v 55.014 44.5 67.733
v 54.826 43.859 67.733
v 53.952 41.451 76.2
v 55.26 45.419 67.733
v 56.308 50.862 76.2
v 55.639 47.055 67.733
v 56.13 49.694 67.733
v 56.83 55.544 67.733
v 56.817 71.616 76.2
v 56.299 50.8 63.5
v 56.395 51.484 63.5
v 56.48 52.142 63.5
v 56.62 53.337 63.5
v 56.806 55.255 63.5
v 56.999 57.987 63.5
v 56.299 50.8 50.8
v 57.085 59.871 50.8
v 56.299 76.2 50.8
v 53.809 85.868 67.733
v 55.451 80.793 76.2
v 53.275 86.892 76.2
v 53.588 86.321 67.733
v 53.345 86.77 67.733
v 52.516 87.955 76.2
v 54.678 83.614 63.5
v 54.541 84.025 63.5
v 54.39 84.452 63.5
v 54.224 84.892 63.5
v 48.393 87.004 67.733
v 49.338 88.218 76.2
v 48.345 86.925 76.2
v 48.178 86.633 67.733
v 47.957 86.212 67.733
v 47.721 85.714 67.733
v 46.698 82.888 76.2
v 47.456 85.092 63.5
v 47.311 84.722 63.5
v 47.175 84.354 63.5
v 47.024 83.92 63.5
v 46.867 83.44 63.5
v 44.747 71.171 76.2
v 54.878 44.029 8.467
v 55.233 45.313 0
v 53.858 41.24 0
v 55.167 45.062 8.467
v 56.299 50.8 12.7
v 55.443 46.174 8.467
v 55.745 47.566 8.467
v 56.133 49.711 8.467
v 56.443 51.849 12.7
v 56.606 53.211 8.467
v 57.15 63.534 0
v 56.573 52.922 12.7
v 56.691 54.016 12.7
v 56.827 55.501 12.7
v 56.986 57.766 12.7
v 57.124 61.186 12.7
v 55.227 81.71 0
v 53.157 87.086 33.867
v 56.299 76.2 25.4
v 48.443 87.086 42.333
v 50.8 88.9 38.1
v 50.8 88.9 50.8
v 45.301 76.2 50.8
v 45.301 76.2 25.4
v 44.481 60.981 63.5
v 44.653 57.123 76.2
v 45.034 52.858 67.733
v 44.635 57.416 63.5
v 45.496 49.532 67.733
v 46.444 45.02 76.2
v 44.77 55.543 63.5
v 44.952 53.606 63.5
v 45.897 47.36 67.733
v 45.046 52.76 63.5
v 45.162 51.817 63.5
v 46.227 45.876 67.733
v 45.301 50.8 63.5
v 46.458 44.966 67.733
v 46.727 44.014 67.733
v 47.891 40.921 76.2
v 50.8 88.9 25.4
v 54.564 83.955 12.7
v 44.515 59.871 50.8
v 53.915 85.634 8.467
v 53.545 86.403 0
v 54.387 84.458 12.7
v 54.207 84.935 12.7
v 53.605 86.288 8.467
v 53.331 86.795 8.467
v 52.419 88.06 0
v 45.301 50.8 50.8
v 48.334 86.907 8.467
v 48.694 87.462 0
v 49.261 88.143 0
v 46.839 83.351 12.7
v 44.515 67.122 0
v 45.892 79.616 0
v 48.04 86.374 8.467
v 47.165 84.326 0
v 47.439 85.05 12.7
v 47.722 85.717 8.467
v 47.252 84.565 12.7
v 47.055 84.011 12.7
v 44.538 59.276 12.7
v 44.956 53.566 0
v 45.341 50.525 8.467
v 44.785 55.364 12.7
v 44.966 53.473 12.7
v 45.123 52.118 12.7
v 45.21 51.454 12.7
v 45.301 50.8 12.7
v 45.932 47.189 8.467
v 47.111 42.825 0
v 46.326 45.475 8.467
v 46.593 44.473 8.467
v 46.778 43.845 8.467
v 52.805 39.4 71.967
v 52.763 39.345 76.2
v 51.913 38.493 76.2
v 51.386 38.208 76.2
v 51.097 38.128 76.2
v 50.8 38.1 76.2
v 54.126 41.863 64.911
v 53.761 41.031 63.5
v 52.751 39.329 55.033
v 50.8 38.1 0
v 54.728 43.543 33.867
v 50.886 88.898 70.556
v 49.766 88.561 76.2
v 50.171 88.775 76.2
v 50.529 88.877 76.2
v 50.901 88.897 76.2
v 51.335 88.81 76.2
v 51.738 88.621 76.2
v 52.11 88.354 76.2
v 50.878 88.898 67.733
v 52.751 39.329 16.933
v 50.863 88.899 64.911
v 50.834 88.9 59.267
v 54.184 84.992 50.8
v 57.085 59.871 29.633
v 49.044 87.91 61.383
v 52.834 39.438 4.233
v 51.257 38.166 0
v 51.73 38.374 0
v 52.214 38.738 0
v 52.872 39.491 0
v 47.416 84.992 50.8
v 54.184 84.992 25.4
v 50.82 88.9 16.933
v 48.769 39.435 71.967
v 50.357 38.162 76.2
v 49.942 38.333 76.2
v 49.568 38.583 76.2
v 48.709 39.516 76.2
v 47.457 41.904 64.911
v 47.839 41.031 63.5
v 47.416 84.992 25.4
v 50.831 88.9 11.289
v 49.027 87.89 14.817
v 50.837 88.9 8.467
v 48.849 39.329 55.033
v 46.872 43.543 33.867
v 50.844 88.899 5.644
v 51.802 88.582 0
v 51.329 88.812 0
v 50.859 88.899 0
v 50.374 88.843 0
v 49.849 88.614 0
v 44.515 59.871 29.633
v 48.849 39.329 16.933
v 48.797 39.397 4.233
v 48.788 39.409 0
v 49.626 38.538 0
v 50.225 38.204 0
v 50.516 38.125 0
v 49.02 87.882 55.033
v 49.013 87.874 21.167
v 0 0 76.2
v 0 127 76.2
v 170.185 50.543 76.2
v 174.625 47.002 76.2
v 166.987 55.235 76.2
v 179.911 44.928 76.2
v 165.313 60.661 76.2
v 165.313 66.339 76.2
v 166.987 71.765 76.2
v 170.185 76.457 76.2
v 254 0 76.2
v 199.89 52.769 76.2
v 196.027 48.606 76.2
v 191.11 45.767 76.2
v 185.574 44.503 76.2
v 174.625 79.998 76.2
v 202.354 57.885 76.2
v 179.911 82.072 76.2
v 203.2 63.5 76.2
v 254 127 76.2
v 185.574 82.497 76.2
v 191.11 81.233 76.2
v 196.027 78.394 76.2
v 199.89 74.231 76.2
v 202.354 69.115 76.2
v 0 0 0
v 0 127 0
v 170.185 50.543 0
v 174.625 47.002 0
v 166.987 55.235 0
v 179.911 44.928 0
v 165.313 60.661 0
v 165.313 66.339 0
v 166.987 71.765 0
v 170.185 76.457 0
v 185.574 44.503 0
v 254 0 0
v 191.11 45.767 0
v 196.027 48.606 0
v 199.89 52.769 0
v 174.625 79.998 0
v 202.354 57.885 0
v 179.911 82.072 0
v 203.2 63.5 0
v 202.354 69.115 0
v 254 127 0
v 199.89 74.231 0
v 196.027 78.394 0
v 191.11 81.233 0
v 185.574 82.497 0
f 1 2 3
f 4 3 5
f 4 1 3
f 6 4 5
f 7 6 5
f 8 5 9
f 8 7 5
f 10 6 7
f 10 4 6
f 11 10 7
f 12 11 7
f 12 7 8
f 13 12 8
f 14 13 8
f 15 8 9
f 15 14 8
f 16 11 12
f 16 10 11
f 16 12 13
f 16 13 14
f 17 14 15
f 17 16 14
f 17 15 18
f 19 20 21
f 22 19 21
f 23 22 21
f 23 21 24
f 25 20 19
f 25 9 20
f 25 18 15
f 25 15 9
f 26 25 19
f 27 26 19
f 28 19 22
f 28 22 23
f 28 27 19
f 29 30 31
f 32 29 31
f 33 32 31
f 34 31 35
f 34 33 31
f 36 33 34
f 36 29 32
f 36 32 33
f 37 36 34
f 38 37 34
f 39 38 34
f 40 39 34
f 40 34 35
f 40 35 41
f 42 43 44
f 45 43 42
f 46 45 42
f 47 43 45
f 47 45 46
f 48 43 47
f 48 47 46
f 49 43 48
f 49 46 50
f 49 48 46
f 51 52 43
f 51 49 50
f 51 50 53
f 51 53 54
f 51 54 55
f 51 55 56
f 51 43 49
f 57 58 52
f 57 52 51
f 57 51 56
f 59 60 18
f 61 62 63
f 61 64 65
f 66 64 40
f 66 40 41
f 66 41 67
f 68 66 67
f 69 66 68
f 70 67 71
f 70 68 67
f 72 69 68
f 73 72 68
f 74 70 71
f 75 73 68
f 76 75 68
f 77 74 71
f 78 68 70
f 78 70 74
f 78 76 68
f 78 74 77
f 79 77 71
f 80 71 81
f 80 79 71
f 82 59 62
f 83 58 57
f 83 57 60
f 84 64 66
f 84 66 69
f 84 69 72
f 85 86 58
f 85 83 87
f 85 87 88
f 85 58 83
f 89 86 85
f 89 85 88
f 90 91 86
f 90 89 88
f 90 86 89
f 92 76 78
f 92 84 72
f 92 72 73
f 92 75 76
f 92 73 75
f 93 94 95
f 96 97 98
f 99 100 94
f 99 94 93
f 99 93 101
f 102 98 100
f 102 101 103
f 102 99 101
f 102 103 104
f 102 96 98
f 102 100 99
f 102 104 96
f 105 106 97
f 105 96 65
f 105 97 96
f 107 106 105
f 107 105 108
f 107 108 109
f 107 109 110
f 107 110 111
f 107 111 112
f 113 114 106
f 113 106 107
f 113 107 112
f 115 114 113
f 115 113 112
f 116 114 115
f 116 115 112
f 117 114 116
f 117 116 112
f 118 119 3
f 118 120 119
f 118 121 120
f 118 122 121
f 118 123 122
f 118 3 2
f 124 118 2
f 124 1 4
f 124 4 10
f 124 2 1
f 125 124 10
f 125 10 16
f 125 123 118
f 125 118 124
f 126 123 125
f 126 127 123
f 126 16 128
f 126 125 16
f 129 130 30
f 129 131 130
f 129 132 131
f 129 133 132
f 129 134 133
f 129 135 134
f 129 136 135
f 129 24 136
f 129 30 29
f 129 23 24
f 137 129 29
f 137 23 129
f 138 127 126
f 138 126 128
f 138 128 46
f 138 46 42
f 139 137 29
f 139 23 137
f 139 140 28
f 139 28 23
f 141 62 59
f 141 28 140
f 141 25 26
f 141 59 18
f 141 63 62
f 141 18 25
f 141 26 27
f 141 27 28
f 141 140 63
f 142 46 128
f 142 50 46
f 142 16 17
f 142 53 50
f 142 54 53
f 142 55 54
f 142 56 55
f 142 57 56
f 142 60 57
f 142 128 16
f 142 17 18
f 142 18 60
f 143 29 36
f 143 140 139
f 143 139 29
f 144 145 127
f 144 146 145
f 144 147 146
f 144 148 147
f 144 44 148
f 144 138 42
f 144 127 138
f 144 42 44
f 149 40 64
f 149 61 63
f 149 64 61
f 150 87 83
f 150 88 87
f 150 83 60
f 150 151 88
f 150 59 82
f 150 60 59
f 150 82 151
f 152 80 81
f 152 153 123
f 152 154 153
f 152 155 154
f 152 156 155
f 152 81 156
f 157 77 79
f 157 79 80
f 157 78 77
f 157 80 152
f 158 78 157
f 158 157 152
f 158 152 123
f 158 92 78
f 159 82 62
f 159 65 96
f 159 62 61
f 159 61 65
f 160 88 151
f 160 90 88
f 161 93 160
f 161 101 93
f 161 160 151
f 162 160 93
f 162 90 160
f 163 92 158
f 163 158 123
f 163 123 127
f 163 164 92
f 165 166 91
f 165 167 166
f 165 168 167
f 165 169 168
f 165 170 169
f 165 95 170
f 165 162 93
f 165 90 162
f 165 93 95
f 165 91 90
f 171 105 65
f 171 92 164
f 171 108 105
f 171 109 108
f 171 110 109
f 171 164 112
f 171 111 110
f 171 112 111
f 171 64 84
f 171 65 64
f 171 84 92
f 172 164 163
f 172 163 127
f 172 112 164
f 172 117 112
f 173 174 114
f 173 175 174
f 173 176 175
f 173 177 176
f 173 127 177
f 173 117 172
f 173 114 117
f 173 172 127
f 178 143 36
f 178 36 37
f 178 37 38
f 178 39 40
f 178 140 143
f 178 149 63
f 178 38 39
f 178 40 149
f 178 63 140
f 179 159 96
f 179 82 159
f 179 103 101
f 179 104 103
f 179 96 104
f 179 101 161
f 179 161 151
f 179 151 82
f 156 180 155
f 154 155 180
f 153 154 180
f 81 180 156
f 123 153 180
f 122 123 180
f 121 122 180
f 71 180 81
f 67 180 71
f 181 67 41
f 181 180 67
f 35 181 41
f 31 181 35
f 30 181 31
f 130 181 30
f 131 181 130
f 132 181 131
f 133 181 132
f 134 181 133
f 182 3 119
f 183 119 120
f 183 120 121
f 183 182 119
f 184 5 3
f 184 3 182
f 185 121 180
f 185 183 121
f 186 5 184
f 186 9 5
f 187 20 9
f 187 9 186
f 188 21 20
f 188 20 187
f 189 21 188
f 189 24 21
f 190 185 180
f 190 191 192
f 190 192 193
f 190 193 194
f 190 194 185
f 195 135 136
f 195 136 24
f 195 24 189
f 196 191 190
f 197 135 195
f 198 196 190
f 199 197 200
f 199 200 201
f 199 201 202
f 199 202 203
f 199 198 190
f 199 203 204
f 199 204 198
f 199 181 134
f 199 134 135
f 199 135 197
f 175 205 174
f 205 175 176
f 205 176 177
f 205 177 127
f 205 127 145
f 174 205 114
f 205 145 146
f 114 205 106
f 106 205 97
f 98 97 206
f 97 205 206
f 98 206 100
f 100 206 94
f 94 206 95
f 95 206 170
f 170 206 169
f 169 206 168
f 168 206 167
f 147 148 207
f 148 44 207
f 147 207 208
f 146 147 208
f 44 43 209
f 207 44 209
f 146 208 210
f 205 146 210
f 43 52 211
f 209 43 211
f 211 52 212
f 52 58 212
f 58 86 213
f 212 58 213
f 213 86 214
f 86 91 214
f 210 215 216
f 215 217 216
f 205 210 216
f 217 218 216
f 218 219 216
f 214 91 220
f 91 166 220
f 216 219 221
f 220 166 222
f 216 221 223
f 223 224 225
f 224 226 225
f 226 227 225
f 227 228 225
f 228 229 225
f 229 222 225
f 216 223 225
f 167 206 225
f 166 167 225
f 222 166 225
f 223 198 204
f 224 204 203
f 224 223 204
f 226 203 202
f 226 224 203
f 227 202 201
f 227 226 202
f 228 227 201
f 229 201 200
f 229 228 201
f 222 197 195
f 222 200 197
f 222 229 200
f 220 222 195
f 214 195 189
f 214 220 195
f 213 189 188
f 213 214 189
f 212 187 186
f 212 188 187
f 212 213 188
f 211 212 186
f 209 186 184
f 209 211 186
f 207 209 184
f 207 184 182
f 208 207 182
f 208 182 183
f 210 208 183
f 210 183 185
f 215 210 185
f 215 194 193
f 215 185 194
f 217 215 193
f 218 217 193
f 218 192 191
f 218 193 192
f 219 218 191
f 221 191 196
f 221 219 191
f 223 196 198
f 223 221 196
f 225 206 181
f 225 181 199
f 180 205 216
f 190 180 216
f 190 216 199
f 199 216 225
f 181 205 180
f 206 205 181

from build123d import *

# Parameters (mm, degrees)
F0_W     = 254
F0_H     = 127
F1_DEPTH = 76.2
F4_DEPTH = 76.201
F2_R     = 19.05
F5_DEPTH = 279.4


with BuildPart() as f1:
    # F0 (on Top) → F1 (new body)
    with BuildSketch(Plane.XY):
        with Locations((127, 63.5)):
            Rectangle(F0_W, F0_H)
    extrude(amount=F1_DEPTH)

    # F3 (on Top) → F4 (cut, through all)
    with BuildSketch(Plane.XY):
        with BuildLine():
            add(Edge.make_bspline(
                [(50.8, 38.1), (61.798523, 38.1), (56.299261, 76.2), (50.8, 114.3), (45.300739, 76.2), (39.801477, 38.1), (50.8, 38.1)],
                knots=[0, 0, 0, 2.094395, 2.094395, 4.18879, 4.18879, 6.283185, 6.283185, 6.283185], degree=2, weights=[1, 0.5, 1, 0.5, 1, 0.5, 1]))
        make_face()
    extrude(amount=F4_DEPTH, mode=Mode.SUBTRACT)

    # F2 (on Top) → F5 (cut)
    with BuildSketch(Plane.XY):
        with Locations((184.15, 63.5)):
            Circle(F2_R)
    extrude(amount=F5_DEPTH, mode=Mode.SUBTRACT)


solid = f1.part
